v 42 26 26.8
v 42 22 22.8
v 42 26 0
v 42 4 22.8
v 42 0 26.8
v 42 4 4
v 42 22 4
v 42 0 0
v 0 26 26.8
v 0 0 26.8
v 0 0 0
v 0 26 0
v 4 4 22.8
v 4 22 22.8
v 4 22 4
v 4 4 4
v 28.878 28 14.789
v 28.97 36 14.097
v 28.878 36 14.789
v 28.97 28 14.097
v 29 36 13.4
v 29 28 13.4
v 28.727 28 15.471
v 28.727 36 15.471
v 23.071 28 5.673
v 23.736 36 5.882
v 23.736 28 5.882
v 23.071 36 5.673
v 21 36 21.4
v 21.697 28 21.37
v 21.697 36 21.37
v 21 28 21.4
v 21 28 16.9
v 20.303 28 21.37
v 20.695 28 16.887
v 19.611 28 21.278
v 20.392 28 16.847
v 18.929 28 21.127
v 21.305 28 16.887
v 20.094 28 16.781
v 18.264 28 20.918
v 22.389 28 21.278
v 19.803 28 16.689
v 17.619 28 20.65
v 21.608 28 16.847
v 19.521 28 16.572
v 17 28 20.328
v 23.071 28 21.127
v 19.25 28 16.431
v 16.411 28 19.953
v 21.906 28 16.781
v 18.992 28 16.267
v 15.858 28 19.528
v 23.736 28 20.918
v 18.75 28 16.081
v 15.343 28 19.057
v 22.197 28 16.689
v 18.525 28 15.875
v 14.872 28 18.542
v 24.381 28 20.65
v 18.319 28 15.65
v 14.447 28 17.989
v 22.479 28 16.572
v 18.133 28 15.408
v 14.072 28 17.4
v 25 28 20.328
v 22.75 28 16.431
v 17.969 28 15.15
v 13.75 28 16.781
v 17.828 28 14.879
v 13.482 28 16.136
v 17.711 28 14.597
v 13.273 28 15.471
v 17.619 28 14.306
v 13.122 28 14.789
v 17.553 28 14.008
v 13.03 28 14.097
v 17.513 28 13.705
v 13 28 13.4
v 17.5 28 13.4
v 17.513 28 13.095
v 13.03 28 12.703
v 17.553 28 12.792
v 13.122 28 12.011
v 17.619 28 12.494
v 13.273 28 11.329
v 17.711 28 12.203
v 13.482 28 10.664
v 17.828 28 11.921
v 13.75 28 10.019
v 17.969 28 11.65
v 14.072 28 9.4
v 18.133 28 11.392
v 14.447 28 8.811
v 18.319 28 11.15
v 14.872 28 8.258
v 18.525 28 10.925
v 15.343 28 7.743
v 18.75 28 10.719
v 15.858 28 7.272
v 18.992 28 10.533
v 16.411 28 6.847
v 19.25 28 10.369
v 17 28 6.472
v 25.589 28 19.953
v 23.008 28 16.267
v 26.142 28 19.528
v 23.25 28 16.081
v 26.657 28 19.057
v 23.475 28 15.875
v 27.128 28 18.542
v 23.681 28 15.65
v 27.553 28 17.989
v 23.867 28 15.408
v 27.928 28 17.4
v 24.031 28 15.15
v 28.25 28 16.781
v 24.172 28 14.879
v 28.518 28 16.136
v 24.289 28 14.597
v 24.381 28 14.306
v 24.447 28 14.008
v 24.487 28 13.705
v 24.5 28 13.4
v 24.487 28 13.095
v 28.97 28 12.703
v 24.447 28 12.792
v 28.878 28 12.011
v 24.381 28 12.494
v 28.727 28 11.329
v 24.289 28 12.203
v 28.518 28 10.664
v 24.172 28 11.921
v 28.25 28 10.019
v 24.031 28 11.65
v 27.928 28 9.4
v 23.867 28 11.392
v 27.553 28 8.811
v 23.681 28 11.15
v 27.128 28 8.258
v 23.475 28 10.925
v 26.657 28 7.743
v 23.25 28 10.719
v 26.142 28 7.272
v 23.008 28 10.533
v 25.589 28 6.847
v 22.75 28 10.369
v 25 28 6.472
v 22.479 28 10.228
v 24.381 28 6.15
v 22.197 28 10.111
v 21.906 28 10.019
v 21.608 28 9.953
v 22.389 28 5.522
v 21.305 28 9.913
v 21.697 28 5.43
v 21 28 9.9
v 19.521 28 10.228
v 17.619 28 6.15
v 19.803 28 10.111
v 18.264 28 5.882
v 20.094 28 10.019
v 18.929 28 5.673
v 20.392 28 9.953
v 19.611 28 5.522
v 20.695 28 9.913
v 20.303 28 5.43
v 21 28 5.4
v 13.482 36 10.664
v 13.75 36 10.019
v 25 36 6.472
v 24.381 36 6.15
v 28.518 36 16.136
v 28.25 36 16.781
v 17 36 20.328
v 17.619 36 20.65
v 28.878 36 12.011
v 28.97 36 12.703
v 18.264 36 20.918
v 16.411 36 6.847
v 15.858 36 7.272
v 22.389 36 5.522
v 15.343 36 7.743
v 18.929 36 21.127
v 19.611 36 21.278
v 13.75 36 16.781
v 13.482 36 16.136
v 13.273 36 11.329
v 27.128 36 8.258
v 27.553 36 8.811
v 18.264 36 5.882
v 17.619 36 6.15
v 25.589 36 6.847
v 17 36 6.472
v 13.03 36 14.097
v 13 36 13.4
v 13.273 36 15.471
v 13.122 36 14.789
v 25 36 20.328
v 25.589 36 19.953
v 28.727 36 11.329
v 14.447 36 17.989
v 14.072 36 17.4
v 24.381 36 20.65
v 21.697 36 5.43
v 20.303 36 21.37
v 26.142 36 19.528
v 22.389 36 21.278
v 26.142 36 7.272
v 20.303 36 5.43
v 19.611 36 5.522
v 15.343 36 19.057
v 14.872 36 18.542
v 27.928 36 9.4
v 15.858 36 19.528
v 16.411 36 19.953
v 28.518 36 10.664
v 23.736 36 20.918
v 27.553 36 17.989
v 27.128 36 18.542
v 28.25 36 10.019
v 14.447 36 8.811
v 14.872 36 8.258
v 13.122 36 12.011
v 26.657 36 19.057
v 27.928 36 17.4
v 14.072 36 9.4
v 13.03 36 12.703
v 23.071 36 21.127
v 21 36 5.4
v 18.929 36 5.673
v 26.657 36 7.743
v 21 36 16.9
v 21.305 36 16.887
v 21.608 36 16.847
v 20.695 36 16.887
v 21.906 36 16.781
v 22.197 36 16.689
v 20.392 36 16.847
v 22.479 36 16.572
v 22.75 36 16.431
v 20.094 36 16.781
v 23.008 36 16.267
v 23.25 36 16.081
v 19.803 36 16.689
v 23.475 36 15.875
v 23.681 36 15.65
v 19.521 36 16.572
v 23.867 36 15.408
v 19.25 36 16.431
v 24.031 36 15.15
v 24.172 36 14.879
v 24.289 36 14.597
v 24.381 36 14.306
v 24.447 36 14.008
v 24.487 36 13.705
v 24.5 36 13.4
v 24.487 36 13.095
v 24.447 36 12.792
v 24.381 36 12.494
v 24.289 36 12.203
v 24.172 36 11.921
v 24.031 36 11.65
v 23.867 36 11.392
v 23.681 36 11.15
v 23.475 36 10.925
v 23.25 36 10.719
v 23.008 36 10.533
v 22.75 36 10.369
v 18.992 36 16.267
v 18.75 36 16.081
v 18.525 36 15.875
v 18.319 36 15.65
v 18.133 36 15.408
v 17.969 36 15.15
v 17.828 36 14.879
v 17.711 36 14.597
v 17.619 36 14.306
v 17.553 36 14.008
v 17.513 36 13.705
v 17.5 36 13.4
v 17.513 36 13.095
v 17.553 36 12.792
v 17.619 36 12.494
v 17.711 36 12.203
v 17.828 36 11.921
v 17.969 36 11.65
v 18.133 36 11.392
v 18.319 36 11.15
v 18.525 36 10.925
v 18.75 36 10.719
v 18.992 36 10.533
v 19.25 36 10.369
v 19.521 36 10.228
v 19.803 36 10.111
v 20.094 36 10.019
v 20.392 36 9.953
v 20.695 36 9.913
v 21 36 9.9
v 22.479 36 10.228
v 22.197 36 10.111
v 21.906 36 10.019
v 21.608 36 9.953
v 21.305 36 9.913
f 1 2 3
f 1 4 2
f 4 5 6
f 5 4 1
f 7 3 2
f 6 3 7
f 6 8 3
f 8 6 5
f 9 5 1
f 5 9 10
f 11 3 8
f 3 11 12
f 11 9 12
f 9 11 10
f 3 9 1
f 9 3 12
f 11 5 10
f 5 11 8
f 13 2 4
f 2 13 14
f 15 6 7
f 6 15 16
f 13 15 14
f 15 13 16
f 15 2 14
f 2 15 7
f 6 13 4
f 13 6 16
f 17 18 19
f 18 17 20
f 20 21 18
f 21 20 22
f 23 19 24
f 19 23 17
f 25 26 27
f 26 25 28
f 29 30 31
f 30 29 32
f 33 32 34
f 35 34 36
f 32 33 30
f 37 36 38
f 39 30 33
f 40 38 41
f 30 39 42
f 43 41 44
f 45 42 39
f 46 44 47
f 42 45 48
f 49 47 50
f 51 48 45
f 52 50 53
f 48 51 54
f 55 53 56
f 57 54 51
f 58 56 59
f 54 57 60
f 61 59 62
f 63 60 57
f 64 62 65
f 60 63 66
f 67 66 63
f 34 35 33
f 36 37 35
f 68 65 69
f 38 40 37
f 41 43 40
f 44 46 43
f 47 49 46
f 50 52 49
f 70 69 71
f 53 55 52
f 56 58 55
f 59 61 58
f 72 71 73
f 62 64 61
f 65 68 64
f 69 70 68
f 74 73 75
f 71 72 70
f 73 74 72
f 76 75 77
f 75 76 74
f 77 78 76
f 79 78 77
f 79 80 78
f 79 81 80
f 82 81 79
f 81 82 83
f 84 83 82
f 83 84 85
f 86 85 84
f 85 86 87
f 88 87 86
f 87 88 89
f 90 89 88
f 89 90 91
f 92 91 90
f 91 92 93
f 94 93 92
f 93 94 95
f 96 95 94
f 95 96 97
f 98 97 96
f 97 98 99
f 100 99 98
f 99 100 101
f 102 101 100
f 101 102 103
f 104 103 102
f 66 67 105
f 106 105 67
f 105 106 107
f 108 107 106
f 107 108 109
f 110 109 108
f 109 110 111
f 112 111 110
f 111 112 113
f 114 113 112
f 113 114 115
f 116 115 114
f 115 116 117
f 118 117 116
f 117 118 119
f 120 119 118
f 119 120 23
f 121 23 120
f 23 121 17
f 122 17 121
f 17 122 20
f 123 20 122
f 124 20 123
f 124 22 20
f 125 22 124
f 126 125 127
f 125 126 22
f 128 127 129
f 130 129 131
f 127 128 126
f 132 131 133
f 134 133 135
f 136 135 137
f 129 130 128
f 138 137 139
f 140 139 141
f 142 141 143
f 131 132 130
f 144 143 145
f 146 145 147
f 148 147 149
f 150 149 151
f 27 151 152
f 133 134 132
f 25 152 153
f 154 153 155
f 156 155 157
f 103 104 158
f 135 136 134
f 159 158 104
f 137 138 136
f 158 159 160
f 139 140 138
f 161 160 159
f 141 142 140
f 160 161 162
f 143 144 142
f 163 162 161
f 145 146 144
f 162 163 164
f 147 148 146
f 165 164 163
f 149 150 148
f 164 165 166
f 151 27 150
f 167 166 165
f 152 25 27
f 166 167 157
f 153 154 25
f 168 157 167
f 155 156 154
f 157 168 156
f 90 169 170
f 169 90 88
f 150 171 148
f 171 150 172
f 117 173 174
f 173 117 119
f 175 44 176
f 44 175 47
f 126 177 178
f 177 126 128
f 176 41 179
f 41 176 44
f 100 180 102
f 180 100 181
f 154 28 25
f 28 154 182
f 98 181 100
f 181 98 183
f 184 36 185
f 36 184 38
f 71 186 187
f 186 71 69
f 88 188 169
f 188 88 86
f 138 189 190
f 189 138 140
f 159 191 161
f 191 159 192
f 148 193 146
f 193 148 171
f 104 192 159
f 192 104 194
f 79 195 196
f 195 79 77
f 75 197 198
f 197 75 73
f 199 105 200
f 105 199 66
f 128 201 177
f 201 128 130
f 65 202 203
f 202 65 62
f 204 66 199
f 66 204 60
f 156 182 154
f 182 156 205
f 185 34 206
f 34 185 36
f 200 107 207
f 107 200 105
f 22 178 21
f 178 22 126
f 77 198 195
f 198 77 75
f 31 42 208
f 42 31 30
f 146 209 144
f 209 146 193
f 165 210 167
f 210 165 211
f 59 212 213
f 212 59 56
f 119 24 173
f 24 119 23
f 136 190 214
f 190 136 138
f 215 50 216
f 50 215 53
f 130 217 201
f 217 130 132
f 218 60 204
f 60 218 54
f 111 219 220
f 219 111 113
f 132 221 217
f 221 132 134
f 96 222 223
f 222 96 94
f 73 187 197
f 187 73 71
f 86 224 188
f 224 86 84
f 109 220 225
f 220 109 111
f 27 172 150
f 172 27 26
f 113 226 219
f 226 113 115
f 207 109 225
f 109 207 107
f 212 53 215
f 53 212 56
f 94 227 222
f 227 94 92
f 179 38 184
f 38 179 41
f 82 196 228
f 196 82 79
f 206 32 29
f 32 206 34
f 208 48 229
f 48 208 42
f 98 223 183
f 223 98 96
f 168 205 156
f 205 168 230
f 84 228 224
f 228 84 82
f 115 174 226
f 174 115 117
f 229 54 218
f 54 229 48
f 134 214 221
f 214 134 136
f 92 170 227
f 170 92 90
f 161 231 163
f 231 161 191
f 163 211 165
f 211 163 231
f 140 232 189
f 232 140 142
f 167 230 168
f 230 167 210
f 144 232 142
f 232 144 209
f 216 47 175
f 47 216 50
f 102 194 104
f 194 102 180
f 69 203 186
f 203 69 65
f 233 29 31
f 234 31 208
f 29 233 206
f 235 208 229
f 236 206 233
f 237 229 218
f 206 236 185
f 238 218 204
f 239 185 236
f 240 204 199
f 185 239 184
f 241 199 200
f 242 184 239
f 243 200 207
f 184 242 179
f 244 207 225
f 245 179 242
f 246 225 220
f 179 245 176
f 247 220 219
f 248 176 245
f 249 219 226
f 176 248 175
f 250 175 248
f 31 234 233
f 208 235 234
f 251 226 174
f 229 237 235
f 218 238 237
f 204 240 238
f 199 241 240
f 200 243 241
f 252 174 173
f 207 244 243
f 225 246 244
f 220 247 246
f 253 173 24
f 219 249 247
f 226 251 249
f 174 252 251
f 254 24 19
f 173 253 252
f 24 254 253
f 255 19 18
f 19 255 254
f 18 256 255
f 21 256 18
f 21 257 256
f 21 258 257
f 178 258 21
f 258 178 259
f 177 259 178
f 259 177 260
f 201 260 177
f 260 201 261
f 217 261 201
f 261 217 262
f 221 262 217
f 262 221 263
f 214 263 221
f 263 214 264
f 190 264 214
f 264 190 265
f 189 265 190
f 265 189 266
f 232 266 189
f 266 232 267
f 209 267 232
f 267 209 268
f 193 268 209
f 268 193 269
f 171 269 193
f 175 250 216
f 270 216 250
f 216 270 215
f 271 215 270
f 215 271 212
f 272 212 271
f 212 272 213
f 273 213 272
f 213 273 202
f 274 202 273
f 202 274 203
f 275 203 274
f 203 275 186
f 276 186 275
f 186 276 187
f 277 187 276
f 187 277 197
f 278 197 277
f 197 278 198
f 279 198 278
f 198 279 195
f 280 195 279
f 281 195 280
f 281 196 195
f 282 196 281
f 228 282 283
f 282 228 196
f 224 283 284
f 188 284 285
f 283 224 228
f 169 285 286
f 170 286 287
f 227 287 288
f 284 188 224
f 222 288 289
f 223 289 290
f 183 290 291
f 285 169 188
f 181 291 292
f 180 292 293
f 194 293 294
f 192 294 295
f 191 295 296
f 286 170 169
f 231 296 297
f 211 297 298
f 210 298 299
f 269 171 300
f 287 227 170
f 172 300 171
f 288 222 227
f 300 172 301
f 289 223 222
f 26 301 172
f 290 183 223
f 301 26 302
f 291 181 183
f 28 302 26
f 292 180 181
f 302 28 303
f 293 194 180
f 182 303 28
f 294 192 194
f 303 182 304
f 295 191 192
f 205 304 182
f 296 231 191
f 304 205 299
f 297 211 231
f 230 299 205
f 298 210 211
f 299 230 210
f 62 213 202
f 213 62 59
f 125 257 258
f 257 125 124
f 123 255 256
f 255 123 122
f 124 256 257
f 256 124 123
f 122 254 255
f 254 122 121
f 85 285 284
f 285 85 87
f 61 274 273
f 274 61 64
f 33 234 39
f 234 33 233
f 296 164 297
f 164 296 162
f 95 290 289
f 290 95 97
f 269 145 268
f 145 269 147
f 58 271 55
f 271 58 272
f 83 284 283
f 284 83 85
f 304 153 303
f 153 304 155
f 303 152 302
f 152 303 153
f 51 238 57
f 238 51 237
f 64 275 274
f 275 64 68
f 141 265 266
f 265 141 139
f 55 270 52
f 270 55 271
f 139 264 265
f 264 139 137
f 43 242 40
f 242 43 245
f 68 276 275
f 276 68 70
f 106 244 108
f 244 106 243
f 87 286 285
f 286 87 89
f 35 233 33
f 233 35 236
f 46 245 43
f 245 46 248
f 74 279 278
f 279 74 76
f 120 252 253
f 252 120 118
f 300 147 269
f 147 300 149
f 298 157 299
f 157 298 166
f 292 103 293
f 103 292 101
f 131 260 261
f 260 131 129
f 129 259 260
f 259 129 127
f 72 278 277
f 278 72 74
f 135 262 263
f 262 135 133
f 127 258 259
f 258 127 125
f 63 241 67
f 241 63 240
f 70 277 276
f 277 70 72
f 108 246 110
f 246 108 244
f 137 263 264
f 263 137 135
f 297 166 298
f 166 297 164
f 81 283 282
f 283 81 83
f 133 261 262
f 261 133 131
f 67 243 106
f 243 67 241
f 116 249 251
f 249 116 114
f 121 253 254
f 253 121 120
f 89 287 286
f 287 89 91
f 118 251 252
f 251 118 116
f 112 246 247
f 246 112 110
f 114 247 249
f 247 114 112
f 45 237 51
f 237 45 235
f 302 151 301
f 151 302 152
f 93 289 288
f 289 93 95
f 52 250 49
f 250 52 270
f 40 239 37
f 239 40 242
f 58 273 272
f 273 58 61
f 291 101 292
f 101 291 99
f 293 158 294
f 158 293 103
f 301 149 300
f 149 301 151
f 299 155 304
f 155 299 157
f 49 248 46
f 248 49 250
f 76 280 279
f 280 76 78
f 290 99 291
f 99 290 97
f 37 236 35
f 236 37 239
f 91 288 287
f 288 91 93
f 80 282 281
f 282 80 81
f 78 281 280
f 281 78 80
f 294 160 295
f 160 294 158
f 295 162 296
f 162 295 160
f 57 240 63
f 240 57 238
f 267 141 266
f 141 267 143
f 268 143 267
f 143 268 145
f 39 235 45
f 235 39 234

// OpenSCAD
// TS-PET-C04 - Under-Chair Teaser Mount Clip
$fn = 72; panel_t = 18; clip_len = 42; wall = 4; clip_depth = 26; clip_gap = panel_t + 0.8; eye_outer_d = 16; eye_inner_d = 7;
module clip_body() { difference() { cube([clip_len, clip_depth, clip_gap + 2*wall], center = false); translate([wall, wall, wall]) cube([clip_len + 1, clip_depth - 2*wall, clip_gap], center = false); } }
union() { clip_body(); translate([clip_len/2, clip_depth + eye_outer_d/2 - 2, wall + clip_gap/2]) rotate([90,0,0]) difference() { cylinder(h = 8, d = eye_outer_d, center = true); cylinder(h = 10, d = eye_inner_d, center = true); } }
